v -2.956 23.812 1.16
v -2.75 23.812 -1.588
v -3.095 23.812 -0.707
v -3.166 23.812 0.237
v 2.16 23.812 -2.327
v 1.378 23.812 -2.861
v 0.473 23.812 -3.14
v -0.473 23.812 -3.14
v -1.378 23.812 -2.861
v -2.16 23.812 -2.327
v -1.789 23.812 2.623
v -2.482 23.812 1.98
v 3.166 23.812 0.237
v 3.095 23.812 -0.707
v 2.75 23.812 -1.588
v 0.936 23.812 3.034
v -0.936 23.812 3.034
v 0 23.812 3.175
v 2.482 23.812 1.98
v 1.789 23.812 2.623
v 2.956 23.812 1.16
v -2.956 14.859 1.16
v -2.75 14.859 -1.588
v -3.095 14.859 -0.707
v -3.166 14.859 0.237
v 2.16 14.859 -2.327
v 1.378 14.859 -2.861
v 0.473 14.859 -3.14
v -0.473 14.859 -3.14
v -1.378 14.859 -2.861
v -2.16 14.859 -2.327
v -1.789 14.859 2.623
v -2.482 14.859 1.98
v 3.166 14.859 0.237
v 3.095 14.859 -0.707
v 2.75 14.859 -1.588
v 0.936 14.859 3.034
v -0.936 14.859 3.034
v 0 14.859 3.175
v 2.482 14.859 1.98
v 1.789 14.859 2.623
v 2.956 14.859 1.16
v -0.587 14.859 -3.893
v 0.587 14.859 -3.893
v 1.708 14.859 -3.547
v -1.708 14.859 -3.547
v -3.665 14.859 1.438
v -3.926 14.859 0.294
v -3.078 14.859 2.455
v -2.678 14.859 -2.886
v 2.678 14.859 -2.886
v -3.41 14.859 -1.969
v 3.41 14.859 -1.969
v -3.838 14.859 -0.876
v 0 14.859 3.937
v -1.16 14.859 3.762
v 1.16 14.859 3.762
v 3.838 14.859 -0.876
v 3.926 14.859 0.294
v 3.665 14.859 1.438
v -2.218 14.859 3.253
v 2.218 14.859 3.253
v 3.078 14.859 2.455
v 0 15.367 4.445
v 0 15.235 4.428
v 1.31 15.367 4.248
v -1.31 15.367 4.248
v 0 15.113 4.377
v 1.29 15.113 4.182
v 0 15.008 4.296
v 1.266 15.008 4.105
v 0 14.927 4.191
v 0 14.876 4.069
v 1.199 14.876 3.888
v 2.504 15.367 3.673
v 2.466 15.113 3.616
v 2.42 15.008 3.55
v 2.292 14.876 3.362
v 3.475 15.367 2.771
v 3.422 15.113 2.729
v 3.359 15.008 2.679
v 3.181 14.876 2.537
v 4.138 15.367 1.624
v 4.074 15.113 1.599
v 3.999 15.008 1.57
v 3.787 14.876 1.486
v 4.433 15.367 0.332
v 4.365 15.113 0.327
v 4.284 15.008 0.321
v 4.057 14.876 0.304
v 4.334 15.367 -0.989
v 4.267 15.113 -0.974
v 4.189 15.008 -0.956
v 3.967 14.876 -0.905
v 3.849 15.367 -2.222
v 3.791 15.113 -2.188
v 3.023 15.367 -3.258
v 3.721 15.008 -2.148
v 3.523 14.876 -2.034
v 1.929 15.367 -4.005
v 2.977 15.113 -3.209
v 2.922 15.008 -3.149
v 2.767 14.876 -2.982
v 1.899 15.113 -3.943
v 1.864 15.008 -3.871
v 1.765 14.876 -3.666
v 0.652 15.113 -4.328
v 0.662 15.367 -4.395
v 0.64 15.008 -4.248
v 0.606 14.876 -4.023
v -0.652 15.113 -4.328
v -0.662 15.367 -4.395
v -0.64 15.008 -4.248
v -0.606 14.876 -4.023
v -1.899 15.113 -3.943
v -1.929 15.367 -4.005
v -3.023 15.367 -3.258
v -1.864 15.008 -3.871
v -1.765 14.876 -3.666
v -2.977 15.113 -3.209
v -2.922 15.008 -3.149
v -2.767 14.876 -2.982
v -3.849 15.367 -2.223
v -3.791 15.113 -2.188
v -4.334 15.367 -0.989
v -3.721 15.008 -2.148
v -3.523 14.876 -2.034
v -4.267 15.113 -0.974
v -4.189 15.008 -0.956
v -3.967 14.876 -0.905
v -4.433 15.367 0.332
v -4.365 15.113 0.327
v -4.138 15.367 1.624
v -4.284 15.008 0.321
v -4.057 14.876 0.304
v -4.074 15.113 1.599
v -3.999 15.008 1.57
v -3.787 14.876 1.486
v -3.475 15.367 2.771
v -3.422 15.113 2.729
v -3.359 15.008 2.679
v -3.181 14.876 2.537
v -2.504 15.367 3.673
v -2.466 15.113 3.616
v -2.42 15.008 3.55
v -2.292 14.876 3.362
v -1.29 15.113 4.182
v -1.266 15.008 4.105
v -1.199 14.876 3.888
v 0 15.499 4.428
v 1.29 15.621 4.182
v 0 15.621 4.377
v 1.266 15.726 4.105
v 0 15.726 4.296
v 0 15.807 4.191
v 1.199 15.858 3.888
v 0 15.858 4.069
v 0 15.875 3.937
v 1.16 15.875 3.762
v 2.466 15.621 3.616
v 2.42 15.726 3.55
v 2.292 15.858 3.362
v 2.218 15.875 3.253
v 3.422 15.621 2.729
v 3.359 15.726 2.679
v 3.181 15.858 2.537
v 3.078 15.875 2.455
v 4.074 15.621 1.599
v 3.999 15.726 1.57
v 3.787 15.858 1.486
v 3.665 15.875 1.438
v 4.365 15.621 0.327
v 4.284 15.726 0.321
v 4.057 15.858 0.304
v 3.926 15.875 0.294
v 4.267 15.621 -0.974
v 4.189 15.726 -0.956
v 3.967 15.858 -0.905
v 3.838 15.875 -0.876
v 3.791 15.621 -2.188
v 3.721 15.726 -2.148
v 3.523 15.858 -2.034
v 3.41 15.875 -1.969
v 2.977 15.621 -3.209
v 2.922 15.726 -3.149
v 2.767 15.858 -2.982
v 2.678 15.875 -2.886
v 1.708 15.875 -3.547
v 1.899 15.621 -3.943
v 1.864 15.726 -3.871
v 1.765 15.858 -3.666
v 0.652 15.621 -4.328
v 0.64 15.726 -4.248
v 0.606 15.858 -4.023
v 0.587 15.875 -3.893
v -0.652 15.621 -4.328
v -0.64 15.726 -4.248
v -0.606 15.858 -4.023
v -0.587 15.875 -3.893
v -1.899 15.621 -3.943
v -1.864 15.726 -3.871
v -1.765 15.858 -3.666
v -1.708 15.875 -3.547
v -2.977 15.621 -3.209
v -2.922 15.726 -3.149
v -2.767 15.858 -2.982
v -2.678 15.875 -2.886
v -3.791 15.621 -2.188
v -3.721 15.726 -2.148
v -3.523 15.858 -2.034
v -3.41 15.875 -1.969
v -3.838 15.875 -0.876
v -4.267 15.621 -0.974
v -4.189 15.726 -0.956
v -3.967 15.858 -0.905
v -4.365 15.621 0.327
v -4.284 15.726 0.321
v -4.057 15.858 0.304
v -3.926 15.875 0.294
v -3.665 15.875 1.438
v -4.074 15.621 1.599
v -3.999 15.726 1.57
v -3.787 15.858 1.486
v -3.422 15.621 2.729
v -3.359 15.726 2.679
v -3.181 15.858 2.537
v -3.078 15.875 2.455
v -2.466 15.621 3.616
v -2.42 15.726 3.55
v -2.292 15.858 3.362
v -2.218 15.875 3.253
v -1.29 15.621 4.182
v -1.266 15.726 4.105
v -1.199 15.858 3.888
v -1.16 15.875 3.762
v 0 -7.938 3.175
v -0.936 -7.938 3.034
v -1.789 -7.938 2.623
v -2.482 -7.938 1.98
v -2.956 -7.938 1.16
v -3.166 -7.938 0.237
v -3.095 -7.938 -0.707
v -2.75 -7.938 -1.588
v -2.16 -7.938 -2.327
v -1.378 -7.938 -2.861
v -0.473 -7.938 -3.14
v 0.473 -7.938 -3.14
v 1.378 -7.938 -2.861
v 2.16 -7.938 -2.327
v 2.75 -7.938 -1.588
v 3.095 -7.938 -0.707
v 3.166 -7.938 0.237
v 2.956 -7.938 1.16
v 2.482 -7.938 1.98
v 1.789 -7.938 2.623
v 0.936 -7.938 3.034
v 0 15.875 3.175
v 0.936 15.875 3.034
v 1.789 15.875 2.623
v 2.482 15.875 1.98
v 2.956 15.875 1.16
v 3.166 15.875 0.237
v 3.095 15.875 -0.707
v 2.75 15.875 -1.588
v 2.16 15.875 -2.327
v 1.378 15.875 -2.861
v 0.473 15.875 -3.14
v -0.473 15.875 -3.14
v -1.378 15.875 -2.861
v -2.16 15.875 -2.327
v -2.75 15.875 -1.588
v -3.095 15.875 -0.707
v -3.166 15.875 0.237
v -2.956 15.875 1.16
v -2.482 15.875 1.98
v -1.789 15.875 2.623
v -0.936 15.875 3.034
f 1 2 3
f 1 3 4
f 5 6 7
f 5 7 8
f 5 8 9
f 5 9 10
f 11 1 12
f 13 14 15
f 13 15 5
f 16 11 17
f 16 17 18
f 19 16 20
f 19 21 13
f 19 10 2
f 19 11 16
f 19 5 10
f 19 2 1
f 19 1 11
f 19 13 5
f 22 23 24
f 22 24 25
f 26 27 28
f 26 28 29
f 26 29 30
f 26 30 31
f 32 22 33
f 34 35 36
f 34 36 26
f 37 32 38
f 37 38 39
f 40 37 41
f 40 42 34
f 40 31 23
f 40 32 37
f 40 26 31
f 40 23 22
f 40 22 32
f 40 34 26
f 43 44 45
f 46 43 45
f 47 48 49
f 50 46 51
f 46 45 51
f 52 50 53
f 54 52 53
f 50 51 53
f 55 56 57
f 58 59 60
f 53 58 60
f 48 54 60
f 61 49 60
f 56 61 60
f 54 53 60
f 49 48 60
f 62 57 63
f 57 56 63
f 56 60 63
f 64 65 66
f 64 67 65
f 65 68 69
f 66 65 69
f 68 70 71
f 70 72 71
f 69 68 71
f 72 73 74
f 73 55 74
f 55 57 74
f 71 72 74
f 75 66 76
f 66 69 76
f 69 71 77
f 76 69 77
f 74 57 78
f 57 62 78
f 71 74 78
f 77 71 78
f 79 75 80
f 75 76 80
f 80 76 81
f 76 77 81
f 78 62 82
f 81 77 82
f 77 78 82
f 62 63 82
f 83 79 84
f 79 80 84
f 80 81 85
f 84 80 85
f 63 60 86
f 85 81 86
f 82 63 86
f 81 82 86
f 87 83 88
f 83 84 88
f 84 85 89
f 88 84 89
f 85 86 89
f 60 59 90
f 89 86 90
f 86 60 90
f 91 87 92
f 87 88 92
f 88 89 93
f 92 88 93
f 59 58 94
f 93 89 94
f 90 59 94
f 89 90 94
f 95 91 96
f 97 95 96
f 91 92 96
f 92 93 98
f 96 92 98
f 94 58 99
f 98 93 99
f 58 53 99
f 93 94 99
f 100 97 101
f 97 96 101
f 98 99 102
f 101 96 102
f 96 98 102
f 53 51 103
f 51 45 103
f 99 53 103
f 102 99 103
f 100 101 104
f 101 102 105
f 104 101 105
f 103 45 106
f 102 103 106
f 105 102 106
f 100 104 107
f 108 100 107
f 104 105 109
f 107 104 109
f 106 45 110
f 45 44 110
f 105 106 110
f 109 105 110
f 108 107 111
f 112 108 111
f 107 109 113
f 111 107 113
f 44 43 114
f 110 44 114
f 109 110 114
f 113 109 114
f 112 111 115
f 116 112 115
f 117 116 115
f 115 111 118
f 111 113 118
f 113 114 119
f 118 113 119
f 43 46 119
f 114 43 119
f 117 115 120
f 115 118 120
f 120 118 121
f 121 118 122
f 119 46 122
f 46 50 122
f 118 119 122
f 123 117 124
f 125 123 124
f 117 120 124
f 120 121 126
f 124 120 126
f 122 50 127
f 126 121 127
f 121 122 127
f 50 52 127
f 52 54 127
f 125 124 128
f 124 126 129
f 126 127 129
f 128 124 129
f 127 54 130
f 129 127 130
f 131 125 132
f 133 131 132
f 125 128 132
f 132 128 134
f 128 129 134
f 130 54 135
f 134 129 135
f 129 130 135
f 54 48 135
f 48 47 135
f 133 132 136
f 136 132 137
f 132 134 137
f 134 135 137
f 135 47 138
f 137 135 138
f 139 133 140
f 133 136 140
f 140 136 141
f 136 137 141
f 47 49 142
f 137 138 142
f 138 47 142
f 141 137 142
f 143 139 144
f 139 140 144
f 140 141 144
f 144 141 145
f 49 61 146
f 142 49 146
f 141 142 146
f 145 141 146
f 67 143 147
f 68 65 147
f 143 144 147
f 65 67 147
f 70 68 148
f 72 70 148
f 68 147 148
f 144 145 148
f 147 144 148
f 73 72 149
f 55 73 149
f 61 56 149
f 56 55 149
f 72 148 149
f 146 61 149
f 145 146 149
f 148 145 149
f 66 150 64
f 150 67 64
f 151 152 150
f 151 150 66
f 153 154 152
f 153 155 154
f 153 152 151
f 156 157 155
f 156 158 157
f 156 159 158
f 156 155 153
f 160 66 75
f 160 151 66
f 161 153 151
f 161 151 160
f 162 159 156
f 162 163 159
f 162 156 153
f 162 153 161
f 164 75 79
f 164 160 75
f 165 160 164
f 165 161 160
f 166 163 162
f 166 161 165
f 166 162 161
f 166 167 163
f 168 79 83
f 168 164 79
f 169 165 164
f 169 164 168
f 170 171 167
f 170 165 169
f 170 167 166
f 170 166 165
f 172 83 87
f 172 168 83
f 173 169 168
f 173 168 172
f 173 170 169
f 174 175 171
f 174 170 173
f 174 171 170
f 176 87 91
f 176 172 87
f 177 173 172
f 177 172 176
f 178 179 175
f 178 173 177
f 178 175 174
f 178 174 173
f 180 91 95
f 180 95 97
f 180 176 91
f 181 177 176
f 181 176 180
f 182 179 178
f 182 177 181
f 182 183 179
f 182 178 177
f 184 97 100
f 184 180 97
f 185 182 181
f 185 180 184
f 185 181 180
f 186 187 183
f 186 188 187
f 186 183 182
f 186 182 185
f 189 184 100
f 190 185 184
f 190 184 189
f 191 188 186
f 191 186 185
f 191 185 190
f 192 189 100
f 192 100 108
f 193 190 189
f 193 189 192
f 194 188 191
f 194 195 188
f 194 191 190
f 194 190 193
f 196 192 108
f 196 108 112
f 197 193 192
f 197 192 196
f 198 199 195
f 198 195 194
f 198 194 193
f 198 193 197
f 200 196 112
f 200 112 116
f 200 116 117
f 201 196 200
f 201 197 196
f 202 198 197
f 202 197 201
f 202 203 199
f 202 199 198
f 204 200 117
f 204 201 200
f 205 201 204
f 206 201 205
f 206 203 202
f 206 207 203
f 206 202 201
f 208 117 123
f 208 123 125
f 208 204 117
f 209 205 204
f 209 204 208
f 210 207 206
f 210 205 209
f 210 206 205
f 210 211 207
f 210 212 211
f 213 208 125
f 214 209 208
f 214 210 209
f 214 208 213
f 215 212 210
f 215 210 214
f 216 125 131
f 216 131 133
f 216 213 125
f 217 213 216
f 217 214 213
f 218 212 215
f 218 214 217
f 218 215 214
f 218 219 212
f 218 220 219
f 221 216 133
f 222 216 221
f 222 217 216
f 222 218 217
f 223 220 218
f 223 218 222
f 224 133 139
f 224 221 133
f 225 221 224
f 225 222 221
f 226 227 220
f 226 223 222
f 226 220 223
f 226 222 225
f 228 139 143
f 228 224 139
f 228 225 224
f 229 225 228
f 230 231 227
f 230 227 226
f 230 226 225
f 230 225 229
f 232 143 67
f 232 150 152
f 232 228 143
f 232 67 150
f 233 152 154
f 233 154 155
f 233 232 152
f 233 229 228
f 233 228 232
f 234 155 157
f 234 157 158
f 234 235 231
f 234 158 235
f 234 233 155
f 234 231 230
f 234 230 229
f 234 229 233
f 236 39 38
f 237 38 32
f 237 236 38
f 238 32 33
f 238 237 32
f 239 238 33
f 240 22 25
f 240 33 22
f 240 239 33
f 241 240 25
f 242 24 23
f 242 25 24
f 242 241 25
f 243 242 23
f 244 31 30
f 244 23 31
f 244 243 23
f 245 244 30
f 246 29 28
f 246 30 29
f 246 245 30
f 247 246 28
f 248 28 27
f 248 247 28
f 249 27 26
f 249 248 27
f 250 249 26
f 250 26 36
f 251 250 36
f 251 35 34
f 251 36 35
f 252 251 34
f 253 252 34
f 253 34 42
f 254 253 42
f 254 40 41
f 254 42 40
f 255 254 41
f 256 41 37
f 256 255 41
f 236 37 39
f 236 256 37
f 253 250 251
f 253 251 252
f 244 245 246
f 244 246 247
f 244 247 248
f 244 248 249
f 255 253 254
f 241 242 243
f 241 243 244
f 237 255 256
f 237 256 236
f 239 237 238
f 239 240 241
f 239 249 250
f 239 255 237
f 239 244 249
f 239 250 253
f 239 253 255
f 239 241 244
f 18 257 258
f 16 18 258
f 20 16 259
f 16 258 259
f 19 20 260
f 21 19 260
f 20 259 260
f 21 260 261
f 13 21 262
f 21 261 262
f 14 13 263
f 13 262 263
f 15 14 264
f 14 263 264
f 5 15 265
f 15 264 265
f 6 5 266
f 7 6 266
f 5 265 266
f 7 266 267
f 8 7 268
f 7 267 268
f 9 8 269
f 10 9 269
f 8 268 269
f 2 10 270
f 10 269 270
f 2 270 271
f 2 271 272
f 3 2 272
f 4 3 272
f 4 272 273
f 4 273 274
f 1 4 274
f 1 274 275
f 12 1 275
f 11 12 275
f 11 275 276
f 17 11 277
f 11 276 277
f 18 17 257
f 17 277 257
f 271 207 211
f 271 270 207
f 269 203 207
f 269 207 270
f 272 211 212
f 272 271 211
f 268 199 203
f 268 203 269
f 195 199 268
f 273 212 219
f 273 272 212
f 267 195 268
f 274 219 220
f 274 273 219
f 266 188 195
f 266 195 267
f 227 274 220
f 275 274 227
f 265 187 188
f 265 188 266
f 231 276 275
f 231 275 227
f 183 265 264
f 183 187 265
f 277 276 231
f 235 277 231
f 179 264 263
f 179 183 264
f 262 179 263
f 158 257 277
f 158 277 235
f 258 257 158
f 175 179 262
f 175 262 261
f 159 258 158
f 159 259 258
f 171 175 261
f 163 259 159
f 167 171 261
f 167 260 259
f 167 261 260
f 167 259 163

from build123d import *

# Parameters (mm, degrees)
SKETCH2_R           = 3.175
BOSS_EXTRUDE1_DEPTH = 14.859
SKETCH3_R           = 4.445
BOSS_EXTRUDE2_DEPTH = 1.016
FILLET2_R           = 0.508
SKETCH4_R           = 3.175
BOSS_EXTRUDE3_DEPTH = 7.9375
BOSS_EXTRUDE4_START = 7.9375
SKETCH5_R           = 3.175
BOSS_EXTRUDE4_DEPTH = 7.9375


with BuildPart() as part:
    # Sketch2 → Boss-Extrude1 (new body)
    with BuildSketch(Plane(origin=(0, 0, 0), x_dir=(1, 0, 0), z_dir=(0, 1, 0))):
        with Locations(Location((0, 0, 0), (0, 0, 270))):
            Circle(SKETCH2_R)
    extrude(amount=BOSS_EXTRUDE1_DEPTH)

    # Sketch5 → Boss-Extrude4 (add)
    with BuildSketch(Plane.XZ.offset(BOSS_EXTRUDE4_START)):
        with Locations(Location((0, 0, 0), (0, 0, 90))):
            Circle(SKETCH5_R)
    extrude(amount=-BOSS_EXTRUDE4_DEPTH)


with BuildPart() as body_2:
    # Sketch3 → Boss-Extrude2 (new body)
    with BuildSketch(Plane(origin=(0, 14.859, 0), x_dir=(1, 0, 0), z_dir=(0, 1, 0))):
        with Locations(Location((0, 0, 0), (0, 0, 270))):
            Circle(SKETCH3_R)
    extrude(amount=BOSS_EXTRUDE2_DEPTH)

    # Fillet2
    fillet2_edges = [body_2.edges().sort_by_distance(p)[0] for p in [
        (0, 14.859, -4.445),
        (0, 15.875, -4.445),
    ]]
    fillet(fillet2_edges, radius=FILLET2_R - 0.0001)  # a hair under: the kernel refuses the full size

    # Sketch4 → Boss-Extrude3 (add)
    with BuildSketch(Plane(origin=(0, 15.875, 0), x_dir=(1, 0, 0), z_dir=(0, 1, 0))):
        with Locations(Location((0, 0, 0), (0, 0, 270))):
            Circle(SKETCH4_R)
    extrude(amount=BOSS_EXTRUDE3_DEPTH)


solid = Compound([part.part, body_2.part])
